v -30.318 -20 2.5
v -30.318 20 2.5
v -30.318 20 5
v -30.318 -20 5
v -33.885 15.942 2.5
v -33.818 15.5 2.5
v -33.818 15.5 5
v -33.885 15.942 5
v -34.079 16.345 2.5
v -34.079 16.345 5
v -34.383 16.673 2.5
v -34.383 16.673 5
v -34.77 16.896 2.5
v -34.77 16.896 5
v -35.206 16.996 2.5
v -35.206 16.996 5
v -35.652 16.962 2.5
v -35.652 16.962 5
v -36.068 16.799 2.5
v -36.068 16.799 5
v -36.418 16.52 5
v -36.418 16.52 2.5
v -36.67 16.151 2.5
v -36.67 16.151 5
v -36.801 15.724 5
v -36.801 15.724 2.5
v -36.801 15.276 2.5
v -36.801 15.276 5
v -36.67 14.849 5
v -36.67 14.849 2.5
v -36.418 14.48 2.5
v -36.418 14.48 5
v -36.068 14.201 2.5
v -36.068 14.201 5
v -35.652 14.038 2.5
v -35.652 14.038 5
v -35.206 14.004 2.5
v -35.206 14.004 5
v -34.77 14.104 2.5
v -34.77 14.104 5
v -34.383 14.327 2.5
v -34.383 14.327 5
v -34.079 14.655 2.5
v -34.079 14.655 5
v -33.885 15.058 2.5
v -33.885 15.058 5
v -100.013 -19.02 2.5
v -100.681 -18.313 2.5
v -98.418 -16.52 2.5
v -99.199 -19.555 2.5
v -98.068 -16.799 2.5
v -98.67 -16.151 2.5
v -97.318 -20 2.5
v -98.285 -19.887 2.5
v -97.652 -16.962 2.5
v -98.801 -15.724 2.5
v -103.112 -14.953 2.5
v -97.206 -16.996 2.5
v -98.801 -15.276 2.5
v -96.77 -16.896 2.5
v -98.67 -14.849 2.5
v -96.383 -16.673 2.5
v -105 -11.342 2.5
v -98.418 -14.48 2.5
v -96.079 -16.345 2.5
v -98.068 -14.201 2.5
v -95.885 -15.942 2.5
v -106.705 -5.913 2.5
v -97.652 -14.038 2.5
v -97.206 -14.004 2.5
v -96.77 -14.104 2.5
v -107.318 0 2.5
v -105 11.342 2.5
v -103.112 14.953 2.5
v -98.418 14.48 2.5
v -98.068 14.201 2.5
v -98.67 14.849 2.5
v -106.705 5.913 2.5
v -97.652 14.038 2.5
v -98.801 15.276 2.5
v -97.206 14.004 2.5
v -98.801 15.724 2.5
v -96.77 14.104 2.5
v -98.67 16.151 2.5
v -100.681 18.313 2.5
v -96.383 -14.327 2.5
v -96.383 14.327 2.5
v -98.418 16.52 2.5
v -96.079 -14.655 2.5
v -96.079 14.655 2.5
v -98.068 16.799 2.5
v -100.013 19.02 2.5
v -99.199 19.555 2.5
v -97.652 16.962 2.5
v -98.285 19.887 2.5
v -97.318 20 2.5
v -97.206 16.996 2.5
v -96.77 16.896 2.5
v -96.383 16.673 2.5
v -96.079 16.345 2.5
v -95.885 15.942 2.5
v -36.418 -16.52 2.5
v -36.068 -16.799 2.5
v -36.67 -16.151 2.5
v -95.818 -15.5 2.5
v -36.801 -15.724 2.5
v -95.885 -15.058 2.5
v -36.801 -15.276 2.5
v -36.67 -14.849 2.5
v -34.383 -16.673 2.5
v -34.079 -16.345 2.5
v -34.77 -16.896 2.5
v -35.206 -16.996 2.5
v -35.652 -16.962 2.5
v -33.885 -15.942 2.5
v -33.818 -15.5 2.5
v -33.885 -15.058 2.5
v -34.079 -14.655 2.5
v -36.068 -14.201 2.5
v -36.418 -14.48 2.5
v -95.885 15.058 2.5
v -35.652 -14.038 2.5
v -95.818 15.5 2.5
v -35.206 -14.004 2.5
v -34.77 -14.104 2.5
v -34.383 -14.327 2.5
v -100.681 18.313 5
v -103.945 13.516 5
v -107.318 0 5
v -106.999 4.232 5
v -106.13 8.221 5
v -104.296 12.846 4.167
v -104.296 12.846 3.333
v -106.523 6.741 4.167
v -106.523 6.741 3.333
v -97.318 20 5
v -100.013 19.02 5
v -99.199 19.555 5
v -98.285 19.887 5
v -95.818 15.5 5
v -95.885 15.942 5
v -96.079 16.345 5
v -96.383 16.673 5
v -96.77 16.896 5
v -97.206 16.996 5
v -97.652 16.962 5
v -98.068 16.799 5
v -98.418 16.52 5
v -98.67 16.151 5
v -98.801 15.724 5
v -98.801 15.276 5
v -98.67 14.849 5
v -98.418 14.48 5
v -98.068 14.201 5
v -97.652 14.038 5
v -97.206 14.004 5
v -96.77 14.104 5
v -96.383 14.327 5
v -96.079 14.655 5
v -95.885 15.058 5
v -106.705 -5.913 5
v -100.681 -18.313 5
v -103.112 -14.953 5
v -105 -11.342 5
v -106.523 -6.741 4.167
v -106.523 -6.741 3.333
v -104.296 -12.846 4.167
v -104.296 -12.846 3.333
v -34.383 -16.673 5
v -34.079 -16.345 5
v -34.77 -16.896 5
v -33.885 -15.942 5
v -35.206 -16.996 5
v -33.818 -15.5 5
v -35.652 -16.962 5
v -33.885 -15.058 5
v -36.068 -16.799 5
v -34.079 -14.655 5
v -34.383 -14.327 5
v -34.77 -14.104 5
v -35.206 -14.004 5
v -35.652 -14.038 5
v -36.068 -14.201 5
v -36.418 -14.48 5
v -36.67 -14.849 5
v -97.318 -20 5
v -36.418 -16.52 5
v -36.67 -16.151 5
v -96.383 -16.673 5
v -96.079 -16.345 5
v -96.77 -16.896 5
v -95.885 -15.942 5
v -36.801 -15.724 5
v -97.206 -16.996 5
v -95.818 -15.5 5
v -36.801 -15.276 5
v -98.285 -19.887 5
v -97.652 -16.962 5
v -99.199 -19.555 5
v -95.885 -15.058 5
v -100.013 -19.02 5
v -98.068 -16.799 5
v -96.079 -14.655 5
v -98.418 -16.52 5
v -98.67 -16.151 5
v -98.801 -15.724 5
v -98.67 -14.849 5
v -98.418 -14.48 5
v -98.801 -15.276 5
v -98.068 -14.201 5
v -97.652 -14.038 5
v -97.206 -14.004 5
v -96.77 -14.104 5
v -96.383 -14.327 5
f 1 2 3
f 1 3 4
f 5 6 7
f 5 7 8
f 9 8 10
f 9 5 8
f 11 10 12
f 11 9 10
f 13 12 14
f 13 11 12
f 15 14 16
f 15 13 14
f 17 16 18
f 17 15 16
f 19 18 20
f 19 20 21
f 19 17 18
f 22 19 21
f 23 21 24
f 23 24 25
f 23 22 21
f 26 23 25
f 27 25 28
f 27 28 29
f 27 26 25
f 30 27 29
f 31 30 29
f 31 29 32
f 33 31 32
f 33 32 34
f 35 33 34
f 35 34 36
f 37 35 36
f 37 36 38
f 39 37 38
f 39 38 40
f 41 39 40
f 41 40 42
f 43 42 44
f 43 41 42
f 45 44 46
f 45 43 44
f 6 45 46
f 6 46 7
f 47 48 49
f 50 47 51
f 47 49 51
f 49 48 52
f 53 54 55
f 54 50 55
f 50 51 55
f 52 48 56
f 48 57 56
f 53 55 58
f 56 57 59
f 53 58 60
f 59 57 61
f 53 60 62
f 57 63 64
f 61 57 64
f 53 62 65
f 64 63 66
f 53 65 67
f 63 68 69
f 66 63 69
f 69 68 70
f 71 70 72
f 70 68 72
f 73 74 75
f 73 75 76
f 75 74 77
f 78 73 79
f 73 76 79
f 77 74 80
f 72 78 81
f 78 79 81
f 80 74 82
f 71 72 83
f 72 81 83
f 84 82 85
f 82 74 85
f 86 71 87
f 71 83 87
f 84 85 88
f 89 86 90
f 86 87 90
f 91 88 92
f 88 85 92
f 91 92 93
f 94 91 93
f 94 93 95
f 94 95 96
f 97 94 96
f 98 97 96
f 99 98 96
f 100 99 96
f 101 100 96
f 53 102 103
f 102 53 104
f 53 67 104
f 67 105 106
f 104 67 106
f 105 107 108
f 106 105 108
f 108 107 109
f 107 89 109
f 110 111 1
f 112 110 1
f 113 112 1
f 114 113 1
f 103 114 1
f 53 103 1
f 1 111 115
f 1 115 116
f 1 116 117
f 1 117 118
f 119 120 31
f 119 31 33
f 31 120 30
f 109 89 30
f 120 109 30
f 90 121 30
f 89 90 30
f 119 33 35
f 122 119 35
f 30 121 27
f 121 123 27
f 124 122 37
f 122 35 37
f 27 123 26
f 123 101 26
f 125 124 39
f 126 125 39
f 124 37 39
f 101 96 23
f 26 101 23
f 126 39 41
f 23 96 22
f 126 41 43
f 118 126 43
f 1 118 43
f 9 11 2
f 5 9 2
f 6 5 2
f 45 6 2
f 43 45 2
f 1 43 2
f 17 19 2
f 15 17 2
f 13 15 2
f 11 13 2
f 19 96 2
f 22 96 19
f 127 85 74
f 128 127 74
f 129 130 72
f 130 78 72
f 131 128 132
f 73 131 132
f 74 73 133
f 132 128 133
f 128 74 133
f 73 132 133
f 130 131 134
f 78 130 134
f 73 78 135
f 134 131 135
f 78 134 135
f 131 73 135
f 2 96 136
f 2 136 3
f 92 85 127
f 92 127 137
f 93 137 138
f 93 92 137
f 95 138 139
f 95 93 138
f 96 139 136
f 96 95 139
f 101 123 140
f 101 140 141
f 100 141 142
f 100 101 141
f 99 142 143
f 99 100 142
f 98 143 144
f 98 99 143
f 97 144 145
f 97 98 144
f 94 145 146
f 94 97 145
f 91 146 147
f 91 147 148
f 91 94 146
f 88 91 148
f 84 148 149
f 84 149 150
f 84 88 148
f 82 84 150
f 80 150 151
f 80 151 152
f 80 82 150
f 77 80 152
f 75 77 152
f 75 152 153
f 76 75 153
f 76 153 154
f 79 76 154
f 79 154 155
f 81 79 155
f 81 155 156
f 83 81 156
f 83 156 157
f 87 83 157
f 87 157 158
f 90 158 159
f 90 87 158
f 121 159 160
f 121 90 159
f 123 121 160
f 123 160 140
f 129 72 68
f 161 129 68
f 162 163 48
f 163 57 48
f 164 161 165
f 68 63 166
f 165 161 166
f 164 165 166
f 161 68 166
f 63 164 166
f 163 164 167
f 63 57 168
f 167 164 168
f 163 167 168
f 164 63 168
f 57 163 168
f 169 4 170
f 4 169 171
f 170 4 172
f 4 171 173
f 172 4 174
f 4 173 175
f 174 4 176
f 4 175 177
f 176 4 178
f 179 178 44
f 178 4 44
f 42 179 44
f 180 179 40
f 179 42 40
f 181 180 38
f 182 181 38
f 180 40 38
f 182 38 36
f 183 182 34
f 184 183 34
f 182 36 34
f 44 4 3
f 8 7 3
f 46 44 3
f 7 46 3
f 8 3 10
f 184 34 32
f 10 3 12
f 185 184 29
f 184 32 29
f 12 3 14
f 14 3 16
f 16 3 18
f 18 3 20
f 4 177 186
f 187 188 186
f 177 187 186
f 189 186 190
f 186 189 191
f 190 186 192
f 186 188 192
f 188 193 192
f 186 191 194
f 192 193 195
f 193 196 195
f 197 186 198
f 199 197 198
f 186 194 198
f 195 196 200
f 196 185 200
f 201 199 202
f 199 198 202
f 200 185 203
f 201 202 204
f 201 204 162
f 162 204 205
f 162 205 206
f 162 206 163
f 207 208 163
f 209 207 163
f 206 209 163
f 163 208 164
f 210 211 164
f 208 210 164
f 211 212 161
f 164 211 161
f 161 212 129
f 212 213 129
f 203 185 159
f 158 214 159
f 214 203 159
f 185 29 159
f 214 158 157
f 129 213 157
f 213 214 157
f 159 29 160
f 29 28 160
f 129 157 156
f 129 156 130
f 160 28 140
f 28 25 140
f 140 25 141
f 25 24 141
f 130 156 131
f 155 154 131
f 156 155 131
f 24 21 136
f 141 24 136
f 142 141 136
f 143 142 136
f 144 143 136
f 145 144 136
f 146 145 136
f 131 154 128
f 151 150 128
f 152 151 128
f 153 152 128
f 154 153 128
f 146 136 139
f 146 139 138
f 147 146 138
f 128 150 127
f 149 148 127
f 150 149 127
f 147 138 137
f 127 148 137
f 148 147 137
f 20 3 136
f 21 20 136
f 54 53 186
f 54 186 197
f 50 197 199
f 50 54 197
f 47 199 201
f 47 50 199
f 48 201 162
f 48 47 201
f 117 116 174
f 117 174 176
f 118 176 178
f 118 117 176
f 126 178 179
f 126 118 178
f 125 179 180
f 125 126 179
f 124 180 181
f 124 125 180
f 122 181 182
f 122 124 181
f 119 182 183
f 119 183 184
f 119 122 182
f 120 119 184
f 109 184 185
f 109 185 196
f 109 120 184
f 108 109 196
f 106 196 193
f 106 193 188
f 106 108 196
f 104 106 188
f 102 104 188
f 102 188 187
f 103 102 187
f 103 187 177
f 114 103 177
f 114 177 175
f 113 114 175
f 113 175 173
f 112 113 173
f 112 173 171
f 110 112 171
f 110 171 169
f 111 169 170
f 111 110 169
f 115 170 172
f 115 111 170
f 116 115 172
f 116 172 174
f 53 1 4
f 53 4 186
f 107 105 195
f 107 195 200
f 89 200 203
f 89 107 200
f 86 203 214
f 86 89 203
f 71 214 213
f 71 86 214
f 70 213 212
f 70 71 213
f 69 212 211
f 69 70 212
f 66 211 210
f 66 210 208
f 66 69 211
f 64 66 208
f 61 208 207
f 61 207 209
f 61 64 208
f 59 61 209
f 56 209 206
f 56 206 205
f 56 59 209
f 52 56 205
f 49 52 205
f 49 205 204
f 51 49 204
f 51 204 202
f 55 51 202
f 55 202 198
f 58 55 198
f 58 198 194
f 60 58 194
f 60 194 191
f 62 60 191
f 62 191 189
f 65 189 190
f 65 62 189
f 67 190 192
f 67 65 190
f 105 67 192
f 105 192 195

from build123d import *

# Parameters (mm, degrees)
CROQUIS1_R              = 2.25
CROQUIS1_R_2            = 3
CROQUIS1_R_3            = 1.5
CROQUIS1_R_4            = 2.249997567
SALIENTE_EXTRUIR1_DEPTH = 2.5
CROQUIS2_R              = 1.5
SALIENTE_EXTRUIR2_DEPTH = 2.5
CORTAR_EXTRUIR3_START   = -2.5
CROQUIS3_W              = 193.648563709
CROQUIS3_H              = 122.889896528
CORTAR_EXTRUIR3_DEPTH   = 2.5


with BuildPart() as part:
    # Croquis1 → Saliente-Extruir1 (new body)
    with BuildSketch(Plane.XY):
        with BuildLine():
            Line((-29.502526327, -44.949972179), (-23.17778065, -37.243838032))
            ThreePointArc((-23.17778065, -37.243838032), (-18.839723212, -32.444384768), (-14.046056443, -28.099933953))
            ThreePointArc((-14.046056443, -28.099933953), (-12.991422185, -27.658257217), (-11.867164621, -27.866527921))
            ThreePointArc((-11.867164621, -27.866527921), (-11.203313373, -28.112469078), (-10.500314, -28.196))
            Line((-10.500314, -28.196), (10.499686, -28.196))
            ThreePointArc((10.499686, -28.196), (11.203007921, -28.112542722), (11.867164264, -27.866528101))
            ThreePointArc((11.867164264, -27.866528101), (12.991422421, -27.658256674), (14.046057406, -28.099933523))
            ThreePointArc((14.046057406, -28.099933523), (18.839775902, -32.444337151), (23.177889012, -37.243749049))
            Line((23.177889012, -37.243749049), (29.502526012, -44.949972049))
            ThreePointArc((29.502526012, -44.949972049), (40.113877497, -46.255199126), (41.931739547, -35.719556022))
            Line((41.931739547, -35.719556022), (21.72923101, -5.566101046))
            ThreePointArc((21.72923101, -5.566101046), (20.036969431, -9.5e-08), (21.729230693, 5.566100954))
            Line((21.729230693, 5.566100954), (41.931739693, 35.719555954))
            ThreePointArc((41.931739693, 35.719555954), (40.113877277, 46.255198335), (29.502526336, 44.949972165))
            Line((29.502526336, 44.949972165), (23.17778065, 37.243838007))
            ThreePointArc((23.17778065, 37.243838007), (18.839723212, 32.444384742), (14.046056443, 28.099933927))
            ThreePointArc((14.046056443, 28.099933927), (12.991421988, 27.658257139), (11.867164252, 27.866528027))
            ThreePointArc((11.867164252, 27.866528027), (11.203313175, 28.112469073), (10.500314, 28.195999974))
            Line((10.500314, 28.195999974), (-10.500314, 28.195999974))
            ThreePointArc((-10.500314, 28.195999974), (-11.203313178, 28.112469098), (-11.867164264, 27.866528075))
            ThreePointArc((-11.867164264, 27.866528075), (-12.991422421, 27.658256648), (-14.046057406, 28.099933497))
            ThreePointArc((-14.046057406, 28.099933497), (-18.839775902, 32.444337126), (-23.177889012, 37.243749023))
            Line((-23.177889012, 37.243749023), (-29.502526012, 44.949972023))
            ThreePointArc((-29.502526012, 44.949972023), (-40.146302424, 46.230987494), (-41.886340556, 35.652554517))
            ThreePointArc((-41.886340556, 35.652554517), (-41.288874902, 25.337679941), (-50.13550001, 20.000000021))
            Line((-50.13550001, 20.000000021), (-97.31807601, 20.000000021))
            ThreePointArc((-97.31807601, 20.000000021), (-99.1994919, 19.554558541), (-100.681450855, 18.312809163))
            add(Edge.make_bspline(
                [(-107.31807554, 2.1e-08), (-107.252414123, 7.059743944), (-104.975710329, 13.164639039), (-100.681450855, 18.312809163)],
                knots=[0, 0, 0, 0, 1, 1, 1, 1], degree=3))
            add(Edge.make_bspline(
                [(-107.31807554, 2.1e-08), (-107.252414123, -7.059743902), (-104.975710329, -13.164638997), (-100.681450855, -18.312809121)],
                knots=[0, 0, 0, 0, 1, 1, 1, 1], degree=3))
            ThreePointArc((-100.681450855, -18.312809121), (-99.19949186, -19.554558345), (-97.31807601, -19.9999997))
            Line((-97.31807601, -19.9999997), (-50.13550001, -19.9999997))
            ThreePointArc((-50.13550001, -19.9999997), (-41.288874902, -25.33767962), (-41.886340556, -35.652554196))
            ThreePointArc((-41.886340556, -35.652554196), (-40.146302646, -46.230987042), (-29.502526327, -44.949972179))
        make_face()
        with Locations((-25.371621, 27.641642)):
            Circle(CROQUIS1_R, mode=Mode.SUBTRACT)
        with Locations((-35.493242035, 40.033284004)):
            Circle(CROQUIS1_R, mode=Mode.SUBTRACT)
        with Locations((-35.49324201, -40.0332837)):
            Circle(CROQUIS1_R, mode=Mode.SUBTRACT)
        with Locations((15.25, -15.25)):
            Circle(CROQUIS1_R_2, mode=Mode.SUBTRACT)
        with Locations((35.493242035, -40.03328403)):
            Circle(CROQUIS1_R, mode=Mode.SUBTRACT)
        with Locations((-15.25, 15.25)):
            Circle(CROQUIS1_R_2, mode=Mode.SUBTRACT)
        with Locations((-25.371621, -27.641642)):
            Circle(CROQUIS1_R, mode=Mode.SUBTRACT)
        with Locations((-35.318076, 15.5)):
            Circle(CROQUIS1_R_3, mode=Mode.SUBTRACT)
        with Locations((25.371621, -27.641642)):
            Circle(CROQUIS1_R, mode=Mode.SUBTRACT)
        with Locations((-15.25, -15.25)):
            Circle(CROQUIS1_R_2, mode=Mode.SUBTRACT)
        with Locations((-97.318076, 15.5)):
            Circle(CROQUIS1_R_3, mode=Mode.SUBTRACT)
        with Locations((15.25, 15.25)):
            Circle(CROQUIS1_R_2, mode=Mode.SUBTRACT)
        with Locations((-35.318076, -15.5)):
            Circle(CROQUIS1_R_3, mode=Mode.SUBTRACT)
        with Locations((25.371621, 27.641642)):
            Circle(CROQUIS1_R, mode=Mode.SUBTRACT)
        with Locations((-97.318076, -15.5)):
            Circle(CROQUIS1_R_3, mode=Mode.SUBTRACT)
        with Locations((35.493241695, 40.03328329)):
            Circle(CROQUIS1_R_4, mode=Mode.SUBTRACT)
        with BuildLine():
            Line((10.499686, -24.196), (-10.500314, -24.196))
            ThreePointArc((-10.500314, -24.196), (-11.500314, -25.196), (-10.500314, -26.196))
            Line((-10.500314, -26.196), (10.499686, -26.196))
            ThreePointArc((10.499686, -26.196), (11.499686, -25.196), (10.499686, -24.196))
        make_face(mode=Mode.SUBTRACT)
        with BuildLine():
            Line((10.499686, 24.196), (-10.500314, 24.196))
            ThreePointArc((-10.500314, 24.196), (-11.500314, 25.196), (-10.500314, 26.196))
            Line((-10.500314, 26.196), (10.499686, 26.196))
            ThreePointArc((10.499686, 26.196), (11.499686, 25.196), (10.499686, 24.196))
        make_face(mode=Mode.SUBTRACT)
        with BuildLine():
            Line((-85.514124, -4.165983), (-47.669779, -4.165983))
            ThreePointArc((-47.669779, -4.165983), (-45.229883846, -6.121043634), (-46.606106368, -8.928419991))
            ThreePointArc((-46.606106368, -8.928419991), (-47.664637652, -9.309528853), (-48.775706549, -9.486329166))
            ThreePointArc((-48.775706549, -9.486329166), (-65.20554454, -10.947799765), (-81.54268179, -13.222314916))
            ThreePointArc((-81.54268179, -13.222314916), (-86.502756567, -11.787005843), (-88.511039815, -7.029984473))
            ThreePointArc((-88.511039815, -7.029984473), (-87.586803958, -4.997112835), (-85.514124, -4.165983))
        make_face(mode=Mode.SUBTRACT)
        with BuildLine():
            Line((-85.514123843, 4.165983), (-47.669779, 4.165983))
            ThreePointArc((-47.669779, 4.165983), (-45.229893438, 6.121044064), (-46.606108087, 8.928416245))
            ThreePointArc((-46.606108087, 8.928416245), (-47.664639263, 9.309527068), (-48.775708446, 9.48632916))
            ThreePointArc((-48.775708446, 9.48632916), (-65.205546063, 10.947798842), (-81.542682989, 13.222313035))
            ThreePointArc((-81.542682989, 13.222313035), (-86.502748912, 11.786999538), (-88.511029539, 7.029984958))
            ThreePointArc((-88.511029539, 7.029984958), (-87.586797502, 4.997116506), (-85.514123843, 4.165983))
        make_face(mode=Mode.SUBTRACT)
    extrude(amount=SALIENTE_EXTRUIR1_DEPTH)

    # Croquis2 → Saliente-Extruir2 (add)
    with BuildSketch(Plane.XY.offset(2.5)):
        with BuildLine():
            Line((-50.13550001, 20.000000021), (-30.318076, 20.000000021))
            Line((-30.318076, 20.000000021), (-30.318076, -19.9999997))
            Line((-30.318076, -19.9999997), (-50.13550001, -19.9999997))
            Line((-50.13550001, -19.9999997), (-97.31807601, -19.9999997))
            ThreePointArc((-97.31807601, -19.9999997), (-99.19949186, -19.554558345), (-100.681450855, -18.312809121))
            add(Edge.make_bspline(
                [(-107.31807554, 2.1e-08), (-107.252414123, -7.059743902), (-104.975710329, -13.164638997), (-100.681450855, -18.312809121)],
                knots=[0, 0, 0, 0, 1, 1, 1, 1], degree=3))
            add(Edge.make_bspline(
                [(-100.681450855, 18.312809163), (-104.975710329, 13.164639039), (-107.252414123, 7.059743944), (-107.31807554, 2.1e-08)],
                knots=[0, 0, 0, 0, 1, 1, 1, 1], degree=3))
            ThreePointArc((-100.681450855, 18.312809163), (-99.1994919, 19.554558541), (-97.31807601, 20.000000021))
            Line((-97.31807601, 20.000000021), (-50.13550001, 20.000000021))
        make_face()
        with Locations((-35.318076, 15.5)):
            Circle(CROQUIS2_R, mode=Mode.SUBTRACT)
        with Locations((-35.318076, -15.5)):
            Circle(CROQUIS2_R, mode=Mode.SUBTRACT)
        with Locations((-97.318076, -15.5)):
            Circle(CROQUIS2_R, mode=Mode.SUBTRACT)
        with Locations((-97.318076, 15.5)):
            Circle(CROQUIS2_R, mode=Mode.SUBTRACT)
    extrude(amount=SALIENTE_EXTRUIR2_DEPTH)

    # Croquis3 → Cortar-Extruir3 (cut)
    with BuildSketch(Plane.XY.offset(2.5).offset(CORTAR_EXTRUIR3_START)):
        with Locations((-31.186912947, -1.649898241)):
            Rectangle(CROQUIS3_W, CROQUIS3_H)
    extrude(amount=CORTAR_EXTRUIR3_DEPTH, mode=Mode.SUBTRACT)


solid = part.part
